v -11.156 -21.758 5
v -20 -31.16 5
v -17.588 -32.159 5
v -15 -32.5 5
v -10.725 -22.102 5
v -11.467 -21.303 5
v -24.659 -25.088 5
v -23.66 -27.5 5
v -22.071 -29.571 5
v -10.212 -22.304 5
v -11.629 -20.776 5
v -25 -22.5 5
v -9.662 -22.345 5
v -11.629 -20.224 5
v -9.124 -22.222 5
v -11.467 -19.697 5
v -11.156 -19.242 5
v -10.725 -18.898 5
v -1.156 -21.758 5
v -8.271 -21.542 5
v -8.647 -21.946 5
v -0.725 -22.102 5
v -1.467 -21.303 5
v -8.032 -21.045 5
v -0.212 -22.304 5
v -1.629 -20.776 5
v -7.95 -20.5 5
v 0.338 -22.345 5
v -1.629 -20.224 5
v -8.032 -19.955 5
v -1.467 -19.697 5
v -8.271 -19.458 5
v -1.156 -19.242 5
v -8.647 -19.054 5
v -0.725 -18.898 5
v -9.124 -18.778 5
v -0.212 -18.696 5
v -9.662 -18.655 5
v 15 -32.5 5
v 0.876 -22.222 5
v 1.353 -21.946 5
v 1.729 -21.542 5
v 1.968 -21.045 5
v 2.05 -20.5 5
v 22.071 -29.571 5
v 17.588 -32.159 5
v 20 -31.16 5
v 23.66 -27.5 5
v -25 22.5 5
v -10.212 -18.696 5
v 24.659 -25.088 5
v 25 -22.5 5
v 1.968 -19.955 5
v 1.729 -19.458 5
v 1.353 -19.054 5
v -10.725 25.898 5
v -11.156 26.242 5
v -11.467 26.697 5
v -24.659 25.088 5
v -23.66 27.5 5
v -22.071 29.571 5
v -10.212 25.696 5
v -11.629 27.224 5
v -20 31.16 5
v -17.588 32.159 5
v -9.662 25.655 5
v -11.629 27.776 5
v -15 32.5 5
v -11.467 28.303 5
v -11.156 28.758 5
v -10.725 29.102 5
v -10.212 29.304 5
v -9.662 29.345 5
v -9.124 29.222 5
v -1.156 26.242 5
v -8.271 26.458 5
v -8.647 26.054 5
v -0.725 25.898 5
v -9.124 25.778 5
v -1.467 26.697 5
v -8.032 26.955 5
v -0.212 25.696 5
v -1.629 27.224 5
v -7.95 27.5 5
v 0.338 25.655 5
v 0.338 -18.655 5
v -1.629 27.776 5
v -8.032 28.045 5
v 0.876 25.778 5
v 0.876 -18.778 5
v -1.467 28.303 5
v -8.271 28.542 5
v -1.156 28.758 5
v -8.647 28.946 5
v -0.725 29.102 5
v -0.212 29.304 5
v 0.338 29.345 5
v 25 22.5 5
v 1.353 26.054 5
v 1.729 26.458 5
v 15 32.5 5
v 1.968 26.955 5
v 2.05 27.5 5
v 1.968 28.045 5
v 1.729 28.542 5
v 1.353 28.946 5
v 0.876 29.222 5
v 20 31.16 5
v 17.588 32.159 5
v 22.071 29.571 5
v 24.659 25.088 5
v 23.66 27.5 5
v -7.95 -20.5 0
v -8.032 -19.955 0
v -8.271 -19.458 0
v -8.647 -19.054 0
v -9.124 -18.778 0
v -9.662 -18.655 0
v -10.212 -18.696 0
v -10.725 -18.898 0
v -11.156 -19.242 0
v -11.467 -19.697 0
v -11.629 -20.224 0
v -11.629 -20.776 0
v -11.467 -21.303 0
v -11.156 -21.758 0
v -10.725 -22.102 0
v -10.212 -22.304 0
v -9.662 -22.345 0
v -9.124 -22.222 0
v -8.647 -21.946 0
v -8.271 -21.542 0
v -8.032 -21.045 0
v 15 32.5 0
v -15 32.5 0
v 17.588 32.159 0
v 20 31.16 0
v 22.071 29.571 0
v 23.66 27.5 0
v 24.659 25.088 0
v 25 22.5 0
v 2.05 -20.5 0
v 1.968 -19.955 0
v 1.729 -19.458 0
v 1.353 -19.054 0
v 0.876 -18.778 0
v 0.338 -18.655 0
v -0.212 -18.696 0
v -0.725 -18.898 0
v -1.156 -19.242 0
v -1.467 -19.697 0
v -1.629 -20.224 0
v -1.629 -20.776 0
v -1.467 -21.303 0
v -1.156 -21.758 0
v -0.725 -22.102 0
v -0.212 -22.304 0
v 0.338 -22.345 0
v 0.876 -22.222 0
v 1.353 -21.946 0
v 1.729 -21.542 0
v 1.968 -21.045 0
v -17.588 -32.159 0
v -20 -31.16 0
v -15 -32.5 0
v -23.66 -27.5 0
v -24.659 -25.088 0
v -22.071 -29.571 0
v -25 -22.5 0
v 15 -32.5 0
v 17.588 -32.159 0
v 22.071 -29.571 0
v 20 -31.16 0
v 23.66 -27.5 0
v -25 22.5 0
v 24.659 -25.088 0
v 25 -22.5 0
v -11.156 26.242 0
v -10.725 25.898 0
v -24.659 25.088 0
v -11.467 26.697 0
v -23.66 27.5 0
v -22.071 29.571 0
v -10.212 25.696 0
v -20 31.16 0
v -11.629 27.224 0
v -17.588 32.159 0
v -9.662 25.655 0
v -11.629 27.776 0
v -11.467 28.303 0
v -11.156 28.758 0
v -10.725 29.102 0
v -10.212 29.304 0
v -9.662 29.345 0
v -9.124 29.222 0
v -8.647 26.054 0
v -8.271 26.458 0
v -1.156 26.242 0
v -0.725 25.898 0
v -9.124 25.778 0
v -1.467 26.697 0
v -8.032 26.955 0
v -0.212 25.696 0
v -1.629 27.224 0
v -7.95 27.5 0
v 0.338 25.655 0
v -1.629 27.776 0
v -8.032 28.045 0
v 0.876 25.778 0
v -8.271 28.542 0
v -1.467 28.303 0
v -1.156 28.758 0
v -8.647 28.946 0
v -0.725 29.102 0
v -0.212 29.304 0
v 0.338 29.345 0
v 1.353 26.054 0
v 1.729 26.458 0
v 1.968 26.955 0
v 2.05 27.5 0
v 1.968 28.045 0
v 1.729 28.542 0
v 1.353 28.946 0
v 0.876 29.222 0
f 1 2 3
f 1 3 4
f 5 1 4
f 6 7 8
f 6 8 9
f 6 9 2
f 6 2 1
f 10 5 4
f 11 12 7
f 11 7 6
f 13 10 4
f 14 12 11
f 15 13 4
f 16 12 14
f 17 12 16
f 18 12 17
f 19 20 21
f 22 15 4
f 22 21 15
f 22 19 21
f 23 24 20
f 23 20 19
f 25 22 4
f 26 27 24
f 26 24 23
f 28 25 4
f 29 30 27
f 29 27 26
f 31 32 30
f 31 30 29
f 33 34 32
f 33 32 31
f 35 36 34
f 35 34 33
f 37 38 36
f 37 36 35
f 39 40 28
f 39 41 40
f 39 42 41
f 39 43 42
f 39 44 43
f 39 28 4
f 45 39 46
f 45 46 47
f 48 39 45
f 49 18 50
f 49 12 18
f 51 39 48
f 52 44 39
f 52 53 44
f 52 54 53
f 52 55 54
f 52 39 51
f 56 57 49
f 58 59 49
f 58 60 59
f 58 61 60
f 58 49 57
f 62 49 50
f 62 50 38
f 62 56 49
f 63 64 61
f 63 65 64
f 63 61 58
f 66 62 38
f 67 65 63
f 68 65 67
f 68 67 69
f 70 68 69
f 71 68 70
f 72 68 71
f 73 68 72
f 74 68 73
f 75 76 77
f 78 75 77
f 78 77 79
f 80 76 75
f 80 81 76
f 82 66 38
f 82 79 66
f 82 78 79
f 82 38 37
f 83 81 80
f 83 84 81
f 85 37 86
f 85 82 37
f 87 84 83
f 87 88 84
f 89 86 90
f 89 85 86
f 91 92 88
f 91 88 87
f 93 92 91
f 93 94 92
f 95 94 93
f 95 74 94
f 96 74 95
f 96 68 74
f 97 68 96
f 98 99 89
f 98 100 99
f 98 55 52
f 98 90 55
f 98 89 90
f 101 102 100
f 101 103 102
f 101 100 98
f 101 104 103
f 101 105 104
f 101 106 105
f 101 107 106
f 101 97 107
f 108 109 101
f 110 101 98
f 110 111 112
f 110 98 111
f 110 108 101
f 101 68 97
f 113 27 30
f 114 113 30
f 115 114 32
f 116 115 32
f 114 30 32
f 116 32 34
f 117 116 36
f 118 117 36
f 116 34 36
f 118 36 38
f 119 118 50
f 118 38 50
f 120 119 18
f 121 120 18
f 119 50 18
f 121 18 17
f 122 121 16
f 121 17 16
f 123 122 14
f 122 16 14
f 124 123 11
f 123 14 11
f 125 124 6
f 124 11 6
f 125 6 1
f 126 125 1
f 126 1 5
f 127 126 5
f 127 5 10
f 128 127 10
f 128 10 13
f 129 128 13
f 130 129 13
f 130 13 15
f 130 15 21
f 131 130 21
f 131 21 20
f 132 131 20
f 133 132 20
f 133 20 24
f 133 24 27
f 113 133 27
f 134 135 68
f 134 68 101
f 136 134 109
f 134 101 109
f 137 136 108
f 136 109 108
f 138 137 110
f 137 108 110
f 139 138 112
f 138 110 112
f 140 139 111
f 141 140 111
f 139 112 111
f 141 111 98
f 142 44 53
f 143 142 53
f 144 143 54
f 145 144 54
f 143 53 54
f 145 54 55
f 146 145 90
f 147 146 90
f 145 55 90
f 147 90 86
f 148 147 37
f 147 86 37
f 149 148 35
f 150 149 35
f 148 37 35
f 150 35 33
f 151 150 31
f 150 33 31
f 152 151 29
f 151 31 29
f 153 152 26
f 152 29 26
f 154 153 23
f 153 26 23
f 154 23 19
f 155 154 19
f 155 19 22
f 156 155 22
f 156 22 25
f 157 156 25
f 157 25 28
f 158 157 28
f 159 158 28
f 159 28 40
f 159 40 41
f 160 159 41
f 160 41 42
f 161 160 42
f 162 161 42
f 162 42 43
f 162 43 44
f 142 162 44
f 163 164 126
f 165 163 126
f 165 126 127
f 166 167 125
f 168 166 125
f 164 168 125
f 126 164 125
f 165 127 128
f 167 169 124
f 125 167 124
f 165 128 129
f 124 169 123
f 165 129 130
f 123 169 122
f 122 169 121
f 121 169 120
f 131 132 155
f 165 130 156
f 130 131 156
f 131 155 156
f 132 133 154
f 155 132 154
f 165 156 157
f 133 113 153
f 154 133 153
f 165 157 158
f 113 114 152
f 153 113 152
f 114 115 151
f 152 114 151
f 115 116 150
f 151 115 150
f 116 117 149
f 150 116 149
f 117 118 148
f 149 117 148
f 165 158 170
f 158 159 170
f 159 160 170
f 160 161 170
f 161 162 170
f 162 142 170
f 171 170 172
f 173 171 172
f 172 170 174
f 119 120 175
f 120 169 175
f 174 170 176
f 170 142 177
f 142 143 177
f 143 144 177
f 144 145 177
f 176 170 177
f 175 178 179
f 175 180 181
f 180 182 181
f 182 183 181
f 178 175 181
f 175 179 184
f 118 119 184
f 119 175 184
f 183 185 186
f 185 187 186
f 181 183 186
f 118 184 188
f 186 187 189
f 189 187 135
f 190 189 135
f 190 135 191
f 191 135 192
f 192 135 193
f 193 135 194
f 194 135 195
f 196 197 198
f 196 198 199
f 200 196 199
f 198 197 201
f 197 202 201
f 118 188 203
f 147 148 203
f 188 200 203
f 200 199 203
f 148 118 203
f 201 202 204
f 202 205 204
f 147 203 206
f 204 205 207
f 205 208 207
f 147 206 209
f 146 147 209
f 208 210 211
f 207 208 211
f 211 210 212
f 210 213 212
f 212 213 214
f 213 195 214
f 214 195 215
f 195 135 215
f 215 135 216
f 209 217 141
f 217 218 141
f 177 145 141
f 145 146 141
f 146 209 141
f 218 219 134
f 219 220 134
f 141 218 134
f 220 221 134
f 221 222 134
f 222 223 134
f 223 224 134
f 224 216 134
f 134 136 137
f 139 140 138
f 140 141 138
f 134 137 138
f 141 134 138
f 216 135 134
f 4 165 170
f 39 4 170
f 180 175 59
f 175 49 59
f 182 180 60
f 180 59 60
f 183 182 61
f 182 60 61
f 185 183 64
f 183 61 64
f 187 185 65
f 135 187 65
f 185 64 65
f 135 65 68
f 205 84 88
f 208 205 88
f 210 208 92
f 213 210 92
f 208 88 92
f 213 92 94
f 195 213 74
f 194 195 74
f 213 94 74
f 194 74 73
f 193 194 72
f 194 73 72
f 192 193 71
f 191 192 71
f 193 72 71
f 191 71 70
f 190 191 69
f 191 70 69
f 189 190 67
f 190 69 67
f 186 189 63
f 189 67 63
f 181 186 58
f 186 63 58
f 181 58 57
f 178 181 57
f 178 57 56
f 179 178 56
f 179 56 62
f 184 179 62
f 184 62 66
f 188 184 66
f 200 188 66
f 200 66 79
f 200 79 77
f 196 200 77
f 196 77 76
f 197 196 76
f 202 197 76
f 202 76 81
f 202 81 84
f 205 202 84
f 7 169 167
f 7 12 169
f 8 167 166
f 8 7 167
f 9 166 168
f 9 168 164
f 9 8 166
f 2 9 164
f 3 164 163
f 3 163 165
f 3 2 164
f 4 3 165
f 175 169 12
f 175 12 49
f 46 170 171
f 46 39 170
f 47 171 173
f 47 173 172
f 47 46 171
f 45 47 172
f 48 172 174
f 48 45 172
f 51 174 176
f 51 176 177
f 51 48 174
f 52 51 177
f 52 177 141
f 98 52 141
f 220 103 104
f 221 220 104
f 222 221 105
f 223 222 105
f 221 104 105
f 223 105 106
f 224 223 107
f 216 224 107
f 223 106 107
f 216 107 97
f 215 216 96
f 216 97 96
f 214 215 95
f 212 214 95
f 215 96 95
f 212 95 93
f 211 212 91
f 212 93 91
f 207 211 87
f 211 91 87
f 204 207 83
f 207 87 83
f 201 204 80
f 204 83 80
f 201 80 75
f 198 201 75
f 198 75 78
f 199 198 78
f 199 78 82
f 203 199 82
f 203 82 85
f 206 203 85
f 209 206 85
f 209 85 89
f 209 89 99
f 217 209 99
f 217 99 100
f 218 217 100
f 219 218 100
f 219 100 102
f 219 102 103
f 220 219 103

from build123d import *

# Parameters (mm, degrees)
ESQUISSE1_W             = 50
ESQUISSE1_H             = 65
BOSS_EXTRU_1_DEPTH      = 5
ESQUISSE2_R             = 1.85
ENL_V_MAT_EXTRU_1_DEPTH = 42.306779105
CONG_1_R                = 10


with BuildPart() as part:
    # Esquisse1 → Boss.-Extru.1 (new body)
    with BuildSketch(Plane.XY):
        Rectangle(ESQUISSE1_W, ESQUISSE1_H)
    extrude(amount=BOSS_EXTRU_1_DEPTH)

    # Esquisse2 → Enlèv. mat.-Extru.1 (cut, through all)
    with BuildSketch(Plane.XY.offset(5)):
        with Locations((-9.8, -20.5)):
            Circle(ESQUISSE2_R)
        with Locations((0.2, -20.5)):
            Circle(ESQUISSE2_R)
        with Locations((-9.8, 27.5)):
            Circle(ESQUISSE2_R)
        with Locations((0.2, 27.5)):
            Circle(ESQUISSE2_R)
    extrude(amount=-ENL_V_MAT_EXTRU_1_DEPTH, mode=Mode.SUBTRACT)

    # Congé1
    cong_1_edges = [part.edges().sort_by_distance(p)[0] for p in [
        (25, -32.5, 2.5),
        (-25, -32.5, 2.5),
        (-25, 32.5, 2.5),
        (25, 32.5, 2.5),
    ]]
    fillet(cong_1_edges, radius=CONG_1_R)


solid = part.part
